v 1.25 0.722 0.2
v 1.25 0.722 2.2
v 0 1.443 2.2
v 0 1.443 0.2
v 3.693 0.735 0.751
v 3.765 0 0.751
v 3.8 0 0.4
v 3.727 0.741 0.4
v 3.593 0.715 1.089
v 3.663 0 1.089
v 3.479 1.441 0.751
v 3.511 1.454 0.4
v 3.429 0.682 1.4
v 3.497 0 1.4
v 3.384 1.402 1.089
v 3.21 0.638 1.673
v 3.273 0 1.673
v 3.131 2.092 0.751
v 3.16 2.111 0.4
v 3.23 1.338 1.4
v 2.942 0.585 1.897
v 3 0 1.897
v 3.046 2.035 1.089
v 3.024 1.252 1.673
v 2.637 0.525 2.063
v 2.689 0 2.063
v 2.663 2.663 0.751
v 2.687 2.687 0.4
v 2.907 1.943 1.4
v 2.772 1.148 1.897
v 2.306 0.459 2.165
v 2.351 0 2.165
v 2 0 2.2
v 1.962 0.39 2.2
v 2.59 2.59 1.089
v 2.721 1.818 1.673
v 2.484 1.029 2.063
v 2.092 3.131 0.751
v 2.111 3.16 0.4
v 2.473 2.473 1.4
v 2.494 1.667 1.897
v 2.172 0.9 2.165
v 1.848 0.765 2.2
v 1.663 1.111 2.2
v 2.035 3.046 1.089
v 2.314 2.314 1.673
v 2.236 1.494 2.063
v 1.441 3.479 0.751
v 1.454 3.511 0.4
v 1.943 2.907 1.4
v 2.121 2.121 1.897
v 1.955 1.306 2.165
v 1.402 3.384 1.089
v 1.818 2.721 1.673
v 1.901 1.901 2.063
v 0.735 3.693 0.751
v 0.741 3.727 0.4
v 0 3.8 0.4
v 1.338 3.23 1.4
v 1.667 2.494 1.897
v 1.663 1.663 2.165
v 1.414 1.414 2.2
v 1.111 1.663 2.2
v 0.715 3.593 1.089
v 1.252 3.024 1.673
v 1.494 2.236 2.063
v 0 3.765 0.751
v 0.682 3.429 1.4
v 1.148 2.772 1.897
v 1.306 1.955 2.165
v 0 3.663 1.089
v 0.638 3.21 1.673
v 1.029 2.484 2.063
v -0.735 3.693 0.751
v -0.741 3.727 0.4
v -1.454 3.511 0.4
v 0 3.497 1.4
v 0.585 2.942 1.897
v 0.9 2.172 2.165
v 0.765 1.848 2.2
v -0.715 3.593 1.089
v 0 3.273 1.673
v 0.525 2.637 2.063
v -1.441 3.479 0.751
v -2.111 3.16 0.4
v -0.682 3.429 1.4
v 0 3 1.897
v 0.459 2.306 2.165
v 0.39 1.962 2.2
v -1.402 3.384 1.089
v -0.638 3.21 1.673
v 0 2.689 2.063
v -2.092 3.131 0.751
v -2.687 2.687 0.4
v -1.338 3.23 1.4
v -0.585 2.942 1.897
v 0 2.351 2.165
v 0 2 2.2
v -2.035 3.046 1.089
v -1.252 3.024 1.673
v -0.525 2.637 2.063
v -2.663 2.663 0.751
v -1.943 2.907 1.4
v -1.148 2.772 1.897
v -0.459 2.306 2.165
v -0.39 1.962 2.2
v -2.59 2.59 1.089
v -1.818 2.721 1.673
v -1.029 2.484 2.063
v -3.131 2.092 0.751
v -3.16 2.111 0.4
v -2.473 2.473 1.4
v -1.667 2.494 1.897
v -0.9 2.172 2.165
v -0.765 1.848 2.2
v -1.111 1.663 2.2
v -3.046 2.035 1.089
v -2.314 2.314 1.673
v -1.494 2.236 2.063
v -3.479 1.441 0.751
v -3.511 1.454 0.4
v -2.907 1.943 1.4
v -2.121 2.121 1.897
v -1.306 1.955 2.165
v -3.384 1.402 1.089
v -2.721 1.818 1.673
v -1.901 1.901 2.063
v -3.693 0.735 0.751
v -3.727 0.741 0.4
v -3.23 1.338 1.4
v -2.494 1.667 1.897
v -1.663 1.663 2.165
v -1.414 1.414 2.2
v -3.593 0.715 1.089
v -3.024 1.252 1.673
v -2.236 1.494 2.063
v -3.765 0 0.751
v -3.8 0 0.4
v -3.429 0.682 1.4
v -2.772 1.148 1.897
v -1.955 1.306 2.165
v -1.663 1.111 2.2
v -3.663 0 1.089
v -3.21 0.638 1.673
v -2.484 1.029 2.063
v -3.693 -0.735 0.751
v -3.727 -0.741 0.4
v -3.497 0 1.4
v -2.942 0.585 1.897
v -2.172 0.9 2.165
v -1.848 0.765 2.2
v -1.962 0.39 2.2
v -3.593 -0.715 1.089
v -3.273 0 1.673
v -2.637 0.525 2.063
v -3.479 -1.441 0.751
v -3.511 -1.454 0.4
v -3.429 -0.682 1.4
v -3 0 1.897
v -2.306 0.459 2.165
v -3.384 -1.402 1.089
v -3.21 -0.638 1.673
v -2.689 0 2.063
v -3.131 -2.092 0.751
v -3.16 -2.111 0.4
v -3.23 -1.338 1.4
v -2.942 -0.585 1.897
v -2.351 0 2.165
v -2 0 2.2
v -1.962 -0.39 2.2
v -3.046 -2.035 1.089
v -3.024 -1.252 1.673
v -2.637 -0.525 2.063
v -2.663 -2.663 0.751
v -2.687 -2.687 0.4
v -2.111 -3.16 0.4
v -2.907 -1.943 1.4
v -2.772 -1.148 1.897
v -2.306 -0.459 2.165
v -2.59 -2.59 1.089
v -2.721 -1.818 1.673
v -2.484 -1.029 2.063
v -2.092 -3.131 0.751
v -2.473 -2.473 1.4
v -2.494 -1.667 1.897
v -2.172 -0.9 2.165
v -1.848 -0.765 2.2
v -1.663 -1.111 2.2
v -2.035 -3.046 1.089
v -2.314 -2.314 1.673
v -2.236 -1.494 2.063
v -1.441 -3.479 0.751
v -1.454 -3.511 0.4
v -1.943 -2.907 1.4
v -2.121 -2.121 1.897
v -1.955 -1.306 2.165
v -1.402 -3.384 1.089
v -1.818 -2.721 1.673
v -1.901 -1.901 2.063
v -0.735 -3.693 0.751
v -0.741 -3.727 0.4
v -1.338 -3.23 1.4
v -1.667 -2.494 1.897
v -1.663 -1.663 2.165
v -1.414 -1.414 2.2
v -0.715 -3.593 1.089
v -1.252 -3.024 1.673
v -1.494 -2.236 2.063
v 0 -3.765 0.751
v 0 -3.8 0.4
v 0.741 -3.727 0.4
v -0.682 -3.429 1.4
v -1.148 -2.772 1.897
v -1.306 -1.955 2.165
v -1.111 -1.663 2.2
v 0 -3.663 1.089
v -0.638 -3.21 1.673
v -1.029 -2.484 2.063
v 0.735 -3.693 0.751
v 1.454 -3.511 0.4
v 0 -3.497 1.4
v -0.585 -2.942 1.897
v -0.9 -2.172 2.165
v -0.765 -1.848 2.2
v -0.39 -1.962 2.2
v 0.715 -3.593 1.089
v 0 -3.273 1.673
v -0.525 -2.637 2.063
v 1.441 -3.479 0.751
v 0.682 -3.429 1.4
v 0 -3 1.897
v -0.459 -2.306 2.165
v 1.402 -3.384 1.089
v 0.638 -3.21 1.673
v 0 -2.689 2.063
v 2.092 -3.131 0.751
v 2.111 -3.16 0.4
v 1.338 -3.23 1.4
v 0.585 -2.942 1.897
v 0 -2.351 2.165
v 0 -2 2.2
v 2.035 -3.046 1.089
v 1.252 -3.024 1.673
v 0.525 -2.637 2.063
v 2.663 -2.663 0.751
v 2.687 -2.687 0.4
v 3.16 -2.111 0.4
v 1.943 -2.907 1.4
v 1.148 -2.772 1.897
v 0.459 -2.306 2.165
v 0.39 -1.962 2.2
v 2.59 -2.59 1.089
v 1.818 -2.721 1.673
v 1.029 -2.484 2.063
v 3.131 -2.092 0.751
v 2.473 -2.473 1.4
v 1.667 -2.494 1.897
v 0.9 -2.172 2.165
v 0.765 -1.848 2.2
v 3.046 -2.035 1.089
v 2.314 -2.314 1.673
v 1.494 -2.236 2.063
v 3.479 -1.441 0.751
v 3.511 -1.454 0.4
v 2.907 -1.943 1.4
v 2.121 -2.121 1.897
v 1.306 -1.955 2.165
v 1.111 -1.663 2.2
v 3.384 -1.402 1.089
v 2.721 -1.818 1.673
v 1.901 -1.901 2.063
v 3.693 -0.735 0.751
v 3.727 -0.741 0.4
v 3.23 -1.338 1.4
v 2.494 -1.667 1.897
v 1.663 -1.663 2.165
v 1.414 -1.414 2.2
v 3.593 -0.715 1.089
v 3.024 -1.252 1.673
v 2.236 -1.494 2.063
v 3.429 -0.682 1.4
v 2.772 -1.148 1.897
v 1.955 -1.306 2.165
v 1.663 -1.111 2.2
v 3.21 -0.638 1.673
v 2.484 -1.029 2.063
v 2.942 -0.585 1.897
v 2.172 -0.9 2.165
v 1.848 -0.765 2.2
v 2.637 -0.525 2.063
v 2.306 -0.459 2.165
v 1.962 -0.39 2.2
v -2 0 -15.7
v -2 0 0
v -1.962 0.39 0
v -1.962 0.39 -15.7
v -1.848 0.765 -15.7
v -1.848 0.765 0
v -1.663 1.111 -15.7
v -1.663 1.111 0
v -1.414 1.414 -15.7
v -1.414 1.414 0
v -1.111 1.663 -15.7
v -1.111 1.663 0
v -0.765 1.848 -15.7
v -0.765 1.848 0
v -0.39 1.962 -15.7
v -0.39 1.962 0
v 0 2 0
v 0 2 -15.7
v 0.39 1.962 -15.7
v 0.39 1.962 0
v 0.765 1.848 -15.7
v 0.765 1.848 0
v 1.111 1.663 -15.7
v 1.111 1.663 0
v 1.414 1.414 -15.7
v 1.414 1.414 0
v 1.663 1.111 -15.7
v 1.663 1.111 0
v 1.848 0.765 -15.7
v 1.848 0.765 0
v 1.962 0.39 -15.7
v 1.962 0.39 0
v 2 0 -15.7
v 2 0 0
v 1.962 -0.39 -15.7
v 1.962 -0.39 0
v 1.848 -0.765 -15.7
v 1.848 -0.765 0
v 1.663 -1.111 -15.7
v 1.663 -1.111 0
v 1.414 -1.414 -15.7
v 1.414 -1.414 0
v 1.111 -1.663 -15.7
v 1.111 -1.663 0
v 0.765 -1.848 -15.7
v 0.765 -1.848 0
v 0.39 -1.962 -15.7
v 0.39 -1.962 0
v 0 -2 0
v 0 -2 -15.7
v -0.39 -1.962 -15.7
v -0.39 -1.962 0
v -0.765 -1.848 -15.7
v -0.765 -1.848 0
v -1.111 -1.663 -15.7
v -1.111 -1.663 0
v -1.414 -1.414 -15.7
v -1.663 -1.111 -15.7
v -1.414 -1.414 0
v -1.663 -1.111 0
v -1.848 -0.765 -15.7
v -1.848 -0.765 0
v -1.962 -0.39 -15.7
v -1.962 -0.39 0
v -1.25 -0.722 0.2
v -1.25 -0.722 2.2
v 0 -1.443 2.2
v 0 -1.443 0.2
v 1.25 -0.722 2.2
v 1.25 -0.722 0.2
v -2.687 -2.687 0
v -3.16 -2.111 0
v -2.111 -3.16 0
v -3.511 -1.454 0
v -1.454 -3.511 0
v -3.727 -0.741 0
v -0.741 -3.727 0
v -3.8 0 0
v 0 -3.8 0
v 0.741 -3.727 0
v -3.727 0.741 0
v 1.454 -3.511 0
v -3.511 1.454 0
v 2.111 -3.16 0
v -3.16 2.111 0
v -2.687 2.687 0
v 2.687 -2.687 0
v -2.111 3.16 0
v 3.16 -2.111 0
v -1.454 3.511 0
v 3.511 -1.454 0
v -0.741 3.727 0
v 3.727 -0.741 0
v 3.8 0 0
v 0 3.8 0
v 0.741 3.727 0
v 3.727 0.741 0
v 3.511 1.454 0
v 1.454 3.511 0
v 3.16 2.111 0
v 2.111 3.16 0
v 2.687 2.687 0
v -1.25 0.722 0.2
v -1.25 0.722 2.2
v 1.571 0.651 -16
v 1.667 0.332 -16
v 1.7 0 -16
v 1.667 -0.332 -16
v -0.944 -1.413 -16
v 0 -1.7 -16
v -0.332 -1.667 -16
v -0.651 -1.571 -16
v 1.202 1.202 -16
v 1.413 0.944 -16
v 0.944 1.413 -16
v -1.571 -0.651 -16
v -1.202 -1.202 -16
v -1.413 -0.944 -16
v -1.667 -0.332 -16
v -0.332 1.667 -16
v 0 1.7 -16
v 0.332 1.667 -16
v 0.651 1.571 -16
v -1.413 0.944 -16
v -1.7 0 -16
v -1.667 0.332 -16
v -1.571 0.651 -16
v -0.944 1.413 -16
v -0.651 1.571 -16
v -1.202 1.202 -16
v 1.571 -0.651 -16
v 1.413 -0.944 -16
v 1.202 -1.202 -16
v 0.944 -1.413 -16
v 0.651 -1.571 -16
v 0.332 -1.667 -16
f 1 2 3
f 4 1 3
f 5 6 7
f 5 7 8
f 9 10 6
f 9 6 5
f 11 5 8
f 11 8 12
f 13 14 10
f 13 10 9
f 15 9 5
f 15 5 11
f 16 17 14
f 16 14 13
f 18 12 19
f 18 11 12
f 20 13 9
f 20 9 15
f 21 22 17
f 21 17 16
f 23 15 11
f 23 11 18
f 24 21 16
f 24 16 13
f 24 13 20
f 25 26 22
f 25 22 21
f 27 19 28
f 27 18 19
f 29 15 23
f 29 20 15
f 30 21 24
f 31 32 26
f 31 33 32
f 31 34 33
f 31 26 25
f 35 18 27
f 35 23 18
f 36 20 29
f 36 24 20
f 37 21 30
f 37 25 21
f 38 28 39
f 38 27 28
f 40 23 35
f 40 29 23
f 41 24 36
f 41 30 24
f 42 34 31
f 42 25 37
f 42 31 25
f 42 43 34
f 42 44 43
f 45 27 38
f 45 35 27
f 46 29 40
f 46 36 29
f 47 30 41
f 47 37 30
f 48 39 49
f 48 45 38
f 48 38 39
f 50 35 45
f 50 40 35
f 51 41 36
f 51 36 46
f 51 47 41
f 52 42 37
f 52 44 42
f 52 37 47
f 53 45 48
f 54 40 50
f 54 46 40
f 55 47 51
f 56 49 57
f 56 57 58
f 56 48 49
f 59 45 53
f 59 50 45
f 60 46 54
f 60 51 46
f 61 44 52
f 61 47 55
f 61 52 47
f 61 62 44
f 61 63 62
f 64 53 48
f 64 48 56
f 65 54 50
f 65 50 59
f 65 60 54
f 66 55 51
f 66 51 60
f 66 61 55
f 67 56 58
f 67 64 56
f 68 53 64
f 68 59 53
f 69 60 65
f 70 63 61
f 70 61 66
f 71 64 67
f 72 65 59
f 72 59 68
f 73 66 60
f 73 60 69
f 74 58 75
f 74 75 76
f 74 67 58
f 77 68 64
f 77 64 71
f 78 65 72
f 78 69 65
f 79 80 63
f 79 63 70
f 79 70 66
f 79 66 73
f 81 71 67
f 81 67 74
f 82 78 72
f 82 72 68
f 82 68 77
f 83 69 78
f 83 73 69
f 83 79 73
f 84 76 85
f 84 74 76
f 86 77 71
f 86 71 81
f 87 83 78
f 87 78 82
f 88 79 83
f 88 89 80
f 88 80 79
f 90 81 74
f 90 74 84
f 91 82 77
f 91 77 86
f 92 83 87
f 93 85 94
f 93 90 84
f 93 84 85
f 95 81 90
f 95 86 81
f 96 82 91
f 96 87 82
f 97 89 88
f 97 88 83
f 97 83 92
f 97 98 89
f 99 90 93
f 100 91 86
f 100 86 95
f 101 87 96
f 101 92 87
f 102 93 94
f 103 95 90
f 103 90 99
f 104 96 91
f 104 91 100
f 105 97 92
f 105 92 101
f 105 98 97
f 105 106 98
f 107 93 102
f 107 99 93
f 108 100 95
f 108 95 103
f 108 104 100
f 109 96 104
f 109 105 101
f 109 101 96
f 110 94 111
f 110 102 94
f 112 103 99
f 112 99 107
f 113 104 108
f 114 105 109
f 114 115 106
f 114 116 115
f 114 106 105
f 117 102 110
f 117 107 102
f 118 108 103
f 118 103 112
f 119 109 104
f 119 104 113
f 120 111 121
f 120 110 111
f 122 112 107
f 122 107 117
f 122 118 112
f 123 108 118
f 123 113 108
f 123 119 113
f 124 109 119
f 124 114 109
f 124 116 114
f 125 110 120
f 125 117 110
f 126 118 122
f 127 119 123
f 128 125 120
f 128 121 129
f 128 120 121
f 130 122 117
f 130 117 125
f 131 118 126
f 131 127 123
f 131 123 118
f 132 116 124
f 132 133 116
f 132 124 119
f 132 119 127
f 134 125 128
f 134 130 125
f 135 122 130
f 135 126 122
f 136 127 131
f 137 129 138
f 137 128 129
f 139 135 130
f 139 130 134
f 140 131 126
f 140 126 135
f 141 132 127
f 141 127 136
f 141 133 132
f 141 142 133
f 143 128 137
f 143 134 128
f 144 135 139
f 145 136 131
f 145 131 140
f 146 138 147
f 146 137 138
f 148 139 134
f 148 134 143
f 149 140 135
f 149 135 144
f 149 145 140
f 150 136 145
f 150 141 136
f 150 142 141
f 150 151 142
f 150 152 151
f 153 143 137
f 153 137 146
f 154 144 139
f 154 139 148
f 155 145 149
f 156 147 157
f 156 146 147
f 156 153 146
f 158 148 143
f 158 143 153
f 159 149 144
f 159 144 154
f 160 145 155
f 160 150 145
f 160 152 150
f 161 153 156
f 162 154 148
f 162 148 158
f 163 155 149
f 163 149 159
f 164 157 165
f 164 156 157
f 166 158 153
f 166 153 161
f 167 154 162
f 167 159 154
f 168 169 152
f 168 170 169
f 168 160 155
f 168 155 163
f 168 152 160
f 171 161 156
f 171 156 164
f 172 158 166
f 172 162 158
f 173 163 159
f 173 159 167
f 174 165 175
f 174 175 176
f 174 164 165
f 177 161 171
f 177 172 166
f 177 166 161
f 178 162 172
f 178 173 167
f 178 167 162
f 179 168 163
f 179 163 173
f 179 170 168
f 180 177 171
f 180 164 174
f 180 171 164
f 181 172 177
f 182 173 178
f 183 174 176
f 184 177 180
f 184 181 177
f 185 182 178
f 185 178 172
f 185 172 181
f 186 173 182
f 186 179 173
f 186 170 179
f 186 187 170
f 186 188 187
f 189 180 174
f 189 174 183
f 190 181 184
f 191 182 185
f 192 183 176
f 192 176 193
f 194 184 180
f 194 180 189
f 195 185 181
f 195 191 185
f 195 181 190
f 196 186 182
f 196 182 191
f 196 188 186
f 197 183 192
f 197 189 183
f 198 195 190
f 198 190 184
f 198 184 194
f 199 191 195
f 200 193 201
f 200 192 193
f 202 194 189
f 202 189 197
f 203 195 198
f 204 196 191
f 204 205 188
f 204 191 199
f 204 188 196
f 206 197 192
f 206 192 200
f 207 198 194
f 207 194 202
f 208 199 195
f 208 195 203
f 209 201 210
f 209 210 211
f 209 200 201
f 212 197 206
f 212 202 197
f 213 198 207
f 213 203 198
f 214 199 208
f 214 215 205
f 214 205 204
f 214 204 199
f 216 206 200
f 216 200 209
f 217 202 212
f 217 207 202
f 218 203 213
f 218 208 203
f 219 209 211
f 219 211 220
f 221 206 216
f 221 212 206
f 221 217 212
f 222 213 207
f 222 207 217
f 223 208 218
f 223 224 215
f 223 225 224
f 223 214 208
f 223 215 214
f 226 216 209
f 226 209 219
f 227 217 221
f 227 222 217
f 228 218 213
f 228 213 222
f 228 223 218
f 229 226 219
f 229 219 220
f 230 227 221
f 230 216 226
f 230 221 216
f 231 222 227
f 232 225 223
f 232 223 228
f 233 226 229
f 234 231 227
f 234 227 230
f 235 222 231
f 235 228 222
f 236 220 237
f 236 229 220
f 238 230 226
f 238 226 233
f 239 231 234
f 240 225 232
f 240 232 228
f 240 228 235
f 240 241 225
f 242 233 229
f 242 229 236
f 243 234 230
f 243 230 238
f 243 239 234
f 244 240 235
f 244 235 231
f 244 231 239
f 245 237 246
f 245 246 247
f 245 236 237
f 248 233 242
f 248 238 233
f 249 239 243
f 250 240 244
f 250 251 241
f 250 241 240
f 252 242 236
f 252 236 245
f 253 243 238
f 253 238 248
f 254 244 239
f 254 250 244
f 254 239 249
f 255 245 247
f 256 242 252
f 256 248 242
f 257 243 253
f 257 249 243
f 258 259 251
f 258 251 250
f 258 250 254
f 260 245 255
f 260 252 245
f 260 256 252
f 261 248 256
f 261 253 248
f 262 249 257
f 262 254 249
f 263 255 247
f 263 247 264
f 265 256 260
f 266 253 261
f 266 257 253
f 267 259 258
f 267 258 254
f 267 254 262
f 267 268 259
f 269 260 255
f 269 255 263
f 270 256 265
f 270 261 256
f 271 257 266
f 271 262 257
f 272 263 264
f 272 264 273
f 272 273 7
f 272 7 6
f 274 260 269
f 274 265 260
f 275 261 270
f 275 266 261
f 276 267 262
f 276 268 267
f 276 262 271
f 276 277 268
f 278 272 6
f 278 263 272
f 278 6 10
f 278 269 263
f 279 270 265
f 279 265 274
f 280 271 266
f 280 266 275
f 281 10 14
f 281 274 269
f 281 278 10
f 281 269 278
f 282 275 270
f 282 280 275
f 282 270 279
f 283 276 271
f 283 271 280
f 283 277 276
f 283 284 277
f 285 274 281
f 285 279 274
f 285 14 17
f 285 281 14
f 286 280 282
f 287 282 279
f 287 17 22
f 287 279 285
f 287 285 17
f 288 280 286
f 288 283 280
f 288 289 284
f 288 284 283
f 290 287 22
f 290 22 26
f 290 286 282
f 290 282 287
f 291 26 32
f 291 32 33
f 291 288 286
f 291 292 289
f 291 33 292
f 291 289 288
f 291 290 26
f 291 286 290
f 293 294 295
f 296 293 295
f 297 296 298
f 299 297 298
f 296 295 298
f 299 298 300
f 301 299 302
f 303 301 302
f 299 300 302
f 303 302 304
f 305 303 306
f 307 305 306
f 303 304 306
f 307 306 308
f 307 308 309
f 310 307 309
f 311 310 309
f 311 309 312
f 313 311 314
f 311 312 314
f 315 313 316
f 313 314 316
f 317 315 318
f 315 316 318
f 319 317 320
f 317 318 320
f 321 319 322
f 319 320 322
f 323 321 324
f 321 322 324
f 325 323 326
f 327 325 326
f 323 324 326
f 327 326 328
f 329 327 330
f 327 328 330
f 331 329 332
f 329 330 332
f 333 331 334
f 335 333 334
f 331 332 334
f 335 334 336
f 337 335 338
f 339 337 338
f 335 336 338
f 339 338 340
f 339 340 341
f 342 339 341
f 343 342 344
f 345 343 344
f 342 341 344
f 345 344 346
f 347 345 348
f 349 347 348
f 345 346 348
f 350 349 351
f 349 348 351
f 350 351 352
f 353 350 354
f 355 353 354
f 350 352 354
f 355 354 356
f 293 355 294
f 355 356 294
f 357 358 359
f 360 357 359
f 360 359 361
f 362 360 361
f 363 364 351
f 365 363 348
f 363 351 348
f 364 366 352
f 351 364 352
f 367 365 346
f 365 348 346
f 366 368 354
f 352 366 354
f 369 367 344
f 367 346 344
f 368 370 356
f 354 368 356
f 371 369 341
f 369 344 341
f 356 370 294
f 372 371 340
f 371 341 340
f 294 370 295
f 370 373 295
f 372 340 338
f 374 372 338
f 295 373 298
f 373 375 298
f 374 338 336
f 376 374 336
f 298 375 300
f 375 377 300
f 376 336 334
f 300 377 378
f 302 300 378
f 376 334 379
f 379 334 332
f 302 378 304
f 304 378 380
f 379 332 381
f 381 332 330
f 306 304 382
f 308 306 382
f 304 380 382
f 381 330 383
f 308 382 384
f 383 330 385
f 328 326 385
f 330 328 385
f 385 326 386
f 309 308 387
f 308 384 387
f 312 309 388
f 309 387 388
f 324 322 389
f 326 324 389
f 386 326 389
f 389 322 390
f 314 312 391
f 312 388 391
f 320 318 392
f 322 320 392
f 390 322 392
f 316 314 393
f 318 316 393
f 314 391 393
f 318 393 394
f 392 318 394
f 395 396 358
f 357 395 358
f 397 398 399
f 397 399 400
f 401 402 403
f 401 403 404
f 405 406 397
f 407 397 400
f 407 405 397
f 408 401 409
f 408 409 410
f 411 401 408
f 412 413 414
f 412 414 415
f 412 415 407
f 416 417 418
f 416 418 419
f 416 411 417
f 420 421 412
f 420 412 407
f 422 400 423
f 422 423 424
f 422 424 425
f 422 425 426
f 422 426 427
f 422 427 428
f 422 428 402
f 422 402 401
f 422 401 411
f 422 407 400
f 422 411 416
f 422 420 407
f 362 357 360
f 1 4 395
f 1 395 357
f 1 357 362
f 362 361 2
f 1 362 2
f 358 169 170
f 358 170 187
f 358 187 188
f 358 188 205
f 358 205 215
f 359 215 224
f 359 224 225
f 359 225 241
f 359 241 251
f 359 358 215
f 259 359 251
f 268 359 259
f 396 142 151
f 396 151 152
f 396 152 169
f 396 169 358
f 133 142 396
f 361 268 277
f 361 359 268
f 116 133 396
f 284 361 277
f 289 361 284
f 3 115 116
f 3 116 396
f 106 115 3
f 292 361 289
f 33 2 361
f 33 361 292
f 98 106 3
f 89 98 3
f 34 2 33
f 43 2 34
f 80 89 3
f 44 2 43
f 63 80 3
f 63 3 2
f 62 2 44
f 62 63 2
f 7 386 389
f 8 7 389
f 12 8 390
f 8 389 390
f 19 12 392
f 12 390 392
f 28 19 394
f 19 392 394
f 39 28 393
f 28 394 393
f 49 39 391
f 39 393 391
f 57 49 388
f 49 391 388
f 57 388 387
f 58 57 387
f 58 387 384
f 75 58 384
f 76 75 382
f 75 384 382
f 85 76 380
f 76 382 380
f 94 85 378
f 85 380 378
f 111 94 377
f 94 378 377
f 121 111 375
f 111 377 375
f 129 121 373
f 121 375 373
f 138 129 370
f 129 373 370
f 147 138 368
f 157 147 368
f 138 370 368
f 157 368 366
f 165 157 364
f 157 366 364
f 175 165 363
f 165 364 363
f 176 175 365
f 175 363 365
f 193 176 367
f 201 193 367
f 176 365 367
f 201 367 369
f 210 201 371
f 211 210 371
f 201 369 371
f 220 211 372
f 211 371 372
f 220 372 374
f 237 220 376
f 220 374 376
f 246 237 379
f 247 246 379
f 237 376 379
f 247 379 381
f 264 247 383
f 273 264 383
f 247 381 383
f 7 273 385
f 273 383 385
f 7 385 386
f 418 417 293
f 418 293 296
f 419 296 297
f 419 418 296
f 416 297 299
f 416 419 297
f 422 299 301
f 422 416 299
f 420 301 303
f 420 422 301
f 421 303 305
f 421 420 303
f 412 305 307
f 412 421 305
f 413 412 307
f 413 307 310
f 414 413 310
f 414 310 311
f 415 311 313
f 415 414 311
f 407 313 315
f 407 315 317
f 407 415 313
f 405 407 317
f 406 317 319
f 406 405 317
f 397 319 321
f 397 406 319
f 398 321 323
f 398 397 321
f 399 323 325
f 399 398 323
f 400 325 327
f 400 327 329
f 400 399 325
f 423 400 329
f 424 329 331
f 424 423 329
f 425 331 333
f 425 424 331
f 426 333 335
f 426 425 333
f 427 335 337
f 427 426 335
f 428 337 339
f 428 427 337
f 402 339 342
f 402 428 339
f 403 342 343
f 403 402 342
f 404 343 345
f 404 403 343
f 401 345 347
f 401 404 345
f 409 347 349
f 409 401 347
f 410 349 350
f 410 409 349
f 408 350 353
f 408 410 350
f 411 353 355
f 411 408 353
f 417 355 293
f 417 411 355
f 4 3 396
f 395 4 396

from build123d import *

# Parameters (mm, degrees)
SKETCH1_R           = 3.8
BOSS_EXTRUDE1_DEPTH = 2.2
SKETCH2_R           = 2
BOSS_EXTRUDE2_DEPTH = 16
CHAMFER1_SIZE       = 0.3
CUT_EXTRUDE1_DEPTH  = 2
FILLET1_R           = 1.8


with BuildPart() as part:
    # Sketch1 → Boss-Extrude1 (new body)
    with BuildSketch(Plane.XY):
        Circle(SKETCH1_R)
    extrude(amount=BOSS_EXTRUDE1_DEPTH)

    # Sketch2 → Boss-Extrude2 (add)
    with BuildSketch(Plane(origin=(0, 0, 0), x_dir=(-1, 0, 0), z_dir=(0, 0, -1))):
        Circle(SKETCH2_R)
    extrude(amount=BOSS_EXTRUDE2_DEPTH)

    # Chamfer1
    chamfer1_edges = [part.edges().sort_by_distance(p)[0] for p in [
        (2, 0, -16),
    ]]
    chamfer(chamfer1_edges, length=CHAMFER1_SIZE)

    # Sketch3 → Cut-Extrude1 (cut)
    with BuildSketch(Plane.XY.offset(2.2)):
        Polygon((0, 1.443375673), (-1.25, 0.721687836), (-1.25, -0.721687836), (0, -1.443375673), (1.25, -0.721687836), (1.25, 0.721687836), align=None)
    extrude(amount=-CUT_EXTRUDE1_DEPTH, mode=Mode.SUBTRACT)

    # Fillet1
    fillet1_edges = [part.edges().sort_by_distance(p)[0] for p in [
        (-3.8, 0, 2.2),
    ]]
    fillet(fillet1_edges, radius=FILLET1_R)


solid = part.part
